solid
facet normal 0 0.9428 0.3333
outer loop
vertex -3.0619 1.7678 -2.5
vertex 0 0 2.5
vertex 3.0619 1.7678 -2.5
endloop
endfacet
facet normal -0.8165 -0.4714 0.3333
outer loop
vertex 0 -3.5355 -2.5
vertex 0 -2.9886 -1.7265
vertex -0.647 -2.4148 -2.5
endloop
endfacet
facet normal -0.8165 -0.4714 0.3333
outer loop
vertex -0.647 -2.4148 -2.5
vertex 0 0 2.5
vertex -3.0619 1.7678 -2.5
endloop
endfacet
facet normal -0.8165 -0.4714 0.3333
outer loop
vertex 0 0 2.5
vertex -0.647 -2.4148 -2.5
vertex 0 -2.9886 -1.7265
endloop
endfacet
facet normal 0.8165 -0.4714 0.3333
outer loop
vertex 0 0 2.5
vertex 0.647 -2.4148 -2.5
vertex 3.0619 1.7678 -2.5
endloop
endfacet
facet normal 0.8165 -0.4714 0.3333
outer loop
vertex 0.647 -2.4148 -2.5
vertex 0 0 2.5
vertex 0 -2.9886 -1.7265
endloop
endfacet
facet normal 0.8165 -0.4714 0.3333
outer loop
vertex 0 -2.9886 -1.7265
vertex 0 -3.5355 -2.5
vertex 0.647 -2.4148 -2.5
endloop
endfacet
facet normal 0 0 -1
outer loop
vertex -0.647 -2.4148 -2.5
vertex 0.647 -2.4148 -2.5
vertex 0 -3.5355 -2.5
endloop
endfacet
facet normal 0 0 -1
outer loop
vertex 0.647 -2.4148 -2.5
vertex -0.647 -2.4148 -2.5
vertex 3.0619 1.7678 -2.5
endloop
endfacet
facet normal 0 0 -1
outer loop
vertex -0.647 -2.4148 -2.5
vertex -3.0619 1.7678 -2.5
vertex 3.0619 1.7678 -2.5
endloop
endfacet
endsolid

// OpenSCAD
// 4面体骰子
module item(w=10,d=45,p=0){
    rotate([d,0,p])
        cube([w*3,w,w*3],center=true);
}

module dice_4(w=10){
    intersection(){
        translate([0,0,-w])
            intersection_for (a = [ 0 : 2 ])
                item(w,90-acos(1/3),120*a);
        item(w,90,0);
    }
}

w=5;
dice_4(w);

echo(pow(3,1/2));
